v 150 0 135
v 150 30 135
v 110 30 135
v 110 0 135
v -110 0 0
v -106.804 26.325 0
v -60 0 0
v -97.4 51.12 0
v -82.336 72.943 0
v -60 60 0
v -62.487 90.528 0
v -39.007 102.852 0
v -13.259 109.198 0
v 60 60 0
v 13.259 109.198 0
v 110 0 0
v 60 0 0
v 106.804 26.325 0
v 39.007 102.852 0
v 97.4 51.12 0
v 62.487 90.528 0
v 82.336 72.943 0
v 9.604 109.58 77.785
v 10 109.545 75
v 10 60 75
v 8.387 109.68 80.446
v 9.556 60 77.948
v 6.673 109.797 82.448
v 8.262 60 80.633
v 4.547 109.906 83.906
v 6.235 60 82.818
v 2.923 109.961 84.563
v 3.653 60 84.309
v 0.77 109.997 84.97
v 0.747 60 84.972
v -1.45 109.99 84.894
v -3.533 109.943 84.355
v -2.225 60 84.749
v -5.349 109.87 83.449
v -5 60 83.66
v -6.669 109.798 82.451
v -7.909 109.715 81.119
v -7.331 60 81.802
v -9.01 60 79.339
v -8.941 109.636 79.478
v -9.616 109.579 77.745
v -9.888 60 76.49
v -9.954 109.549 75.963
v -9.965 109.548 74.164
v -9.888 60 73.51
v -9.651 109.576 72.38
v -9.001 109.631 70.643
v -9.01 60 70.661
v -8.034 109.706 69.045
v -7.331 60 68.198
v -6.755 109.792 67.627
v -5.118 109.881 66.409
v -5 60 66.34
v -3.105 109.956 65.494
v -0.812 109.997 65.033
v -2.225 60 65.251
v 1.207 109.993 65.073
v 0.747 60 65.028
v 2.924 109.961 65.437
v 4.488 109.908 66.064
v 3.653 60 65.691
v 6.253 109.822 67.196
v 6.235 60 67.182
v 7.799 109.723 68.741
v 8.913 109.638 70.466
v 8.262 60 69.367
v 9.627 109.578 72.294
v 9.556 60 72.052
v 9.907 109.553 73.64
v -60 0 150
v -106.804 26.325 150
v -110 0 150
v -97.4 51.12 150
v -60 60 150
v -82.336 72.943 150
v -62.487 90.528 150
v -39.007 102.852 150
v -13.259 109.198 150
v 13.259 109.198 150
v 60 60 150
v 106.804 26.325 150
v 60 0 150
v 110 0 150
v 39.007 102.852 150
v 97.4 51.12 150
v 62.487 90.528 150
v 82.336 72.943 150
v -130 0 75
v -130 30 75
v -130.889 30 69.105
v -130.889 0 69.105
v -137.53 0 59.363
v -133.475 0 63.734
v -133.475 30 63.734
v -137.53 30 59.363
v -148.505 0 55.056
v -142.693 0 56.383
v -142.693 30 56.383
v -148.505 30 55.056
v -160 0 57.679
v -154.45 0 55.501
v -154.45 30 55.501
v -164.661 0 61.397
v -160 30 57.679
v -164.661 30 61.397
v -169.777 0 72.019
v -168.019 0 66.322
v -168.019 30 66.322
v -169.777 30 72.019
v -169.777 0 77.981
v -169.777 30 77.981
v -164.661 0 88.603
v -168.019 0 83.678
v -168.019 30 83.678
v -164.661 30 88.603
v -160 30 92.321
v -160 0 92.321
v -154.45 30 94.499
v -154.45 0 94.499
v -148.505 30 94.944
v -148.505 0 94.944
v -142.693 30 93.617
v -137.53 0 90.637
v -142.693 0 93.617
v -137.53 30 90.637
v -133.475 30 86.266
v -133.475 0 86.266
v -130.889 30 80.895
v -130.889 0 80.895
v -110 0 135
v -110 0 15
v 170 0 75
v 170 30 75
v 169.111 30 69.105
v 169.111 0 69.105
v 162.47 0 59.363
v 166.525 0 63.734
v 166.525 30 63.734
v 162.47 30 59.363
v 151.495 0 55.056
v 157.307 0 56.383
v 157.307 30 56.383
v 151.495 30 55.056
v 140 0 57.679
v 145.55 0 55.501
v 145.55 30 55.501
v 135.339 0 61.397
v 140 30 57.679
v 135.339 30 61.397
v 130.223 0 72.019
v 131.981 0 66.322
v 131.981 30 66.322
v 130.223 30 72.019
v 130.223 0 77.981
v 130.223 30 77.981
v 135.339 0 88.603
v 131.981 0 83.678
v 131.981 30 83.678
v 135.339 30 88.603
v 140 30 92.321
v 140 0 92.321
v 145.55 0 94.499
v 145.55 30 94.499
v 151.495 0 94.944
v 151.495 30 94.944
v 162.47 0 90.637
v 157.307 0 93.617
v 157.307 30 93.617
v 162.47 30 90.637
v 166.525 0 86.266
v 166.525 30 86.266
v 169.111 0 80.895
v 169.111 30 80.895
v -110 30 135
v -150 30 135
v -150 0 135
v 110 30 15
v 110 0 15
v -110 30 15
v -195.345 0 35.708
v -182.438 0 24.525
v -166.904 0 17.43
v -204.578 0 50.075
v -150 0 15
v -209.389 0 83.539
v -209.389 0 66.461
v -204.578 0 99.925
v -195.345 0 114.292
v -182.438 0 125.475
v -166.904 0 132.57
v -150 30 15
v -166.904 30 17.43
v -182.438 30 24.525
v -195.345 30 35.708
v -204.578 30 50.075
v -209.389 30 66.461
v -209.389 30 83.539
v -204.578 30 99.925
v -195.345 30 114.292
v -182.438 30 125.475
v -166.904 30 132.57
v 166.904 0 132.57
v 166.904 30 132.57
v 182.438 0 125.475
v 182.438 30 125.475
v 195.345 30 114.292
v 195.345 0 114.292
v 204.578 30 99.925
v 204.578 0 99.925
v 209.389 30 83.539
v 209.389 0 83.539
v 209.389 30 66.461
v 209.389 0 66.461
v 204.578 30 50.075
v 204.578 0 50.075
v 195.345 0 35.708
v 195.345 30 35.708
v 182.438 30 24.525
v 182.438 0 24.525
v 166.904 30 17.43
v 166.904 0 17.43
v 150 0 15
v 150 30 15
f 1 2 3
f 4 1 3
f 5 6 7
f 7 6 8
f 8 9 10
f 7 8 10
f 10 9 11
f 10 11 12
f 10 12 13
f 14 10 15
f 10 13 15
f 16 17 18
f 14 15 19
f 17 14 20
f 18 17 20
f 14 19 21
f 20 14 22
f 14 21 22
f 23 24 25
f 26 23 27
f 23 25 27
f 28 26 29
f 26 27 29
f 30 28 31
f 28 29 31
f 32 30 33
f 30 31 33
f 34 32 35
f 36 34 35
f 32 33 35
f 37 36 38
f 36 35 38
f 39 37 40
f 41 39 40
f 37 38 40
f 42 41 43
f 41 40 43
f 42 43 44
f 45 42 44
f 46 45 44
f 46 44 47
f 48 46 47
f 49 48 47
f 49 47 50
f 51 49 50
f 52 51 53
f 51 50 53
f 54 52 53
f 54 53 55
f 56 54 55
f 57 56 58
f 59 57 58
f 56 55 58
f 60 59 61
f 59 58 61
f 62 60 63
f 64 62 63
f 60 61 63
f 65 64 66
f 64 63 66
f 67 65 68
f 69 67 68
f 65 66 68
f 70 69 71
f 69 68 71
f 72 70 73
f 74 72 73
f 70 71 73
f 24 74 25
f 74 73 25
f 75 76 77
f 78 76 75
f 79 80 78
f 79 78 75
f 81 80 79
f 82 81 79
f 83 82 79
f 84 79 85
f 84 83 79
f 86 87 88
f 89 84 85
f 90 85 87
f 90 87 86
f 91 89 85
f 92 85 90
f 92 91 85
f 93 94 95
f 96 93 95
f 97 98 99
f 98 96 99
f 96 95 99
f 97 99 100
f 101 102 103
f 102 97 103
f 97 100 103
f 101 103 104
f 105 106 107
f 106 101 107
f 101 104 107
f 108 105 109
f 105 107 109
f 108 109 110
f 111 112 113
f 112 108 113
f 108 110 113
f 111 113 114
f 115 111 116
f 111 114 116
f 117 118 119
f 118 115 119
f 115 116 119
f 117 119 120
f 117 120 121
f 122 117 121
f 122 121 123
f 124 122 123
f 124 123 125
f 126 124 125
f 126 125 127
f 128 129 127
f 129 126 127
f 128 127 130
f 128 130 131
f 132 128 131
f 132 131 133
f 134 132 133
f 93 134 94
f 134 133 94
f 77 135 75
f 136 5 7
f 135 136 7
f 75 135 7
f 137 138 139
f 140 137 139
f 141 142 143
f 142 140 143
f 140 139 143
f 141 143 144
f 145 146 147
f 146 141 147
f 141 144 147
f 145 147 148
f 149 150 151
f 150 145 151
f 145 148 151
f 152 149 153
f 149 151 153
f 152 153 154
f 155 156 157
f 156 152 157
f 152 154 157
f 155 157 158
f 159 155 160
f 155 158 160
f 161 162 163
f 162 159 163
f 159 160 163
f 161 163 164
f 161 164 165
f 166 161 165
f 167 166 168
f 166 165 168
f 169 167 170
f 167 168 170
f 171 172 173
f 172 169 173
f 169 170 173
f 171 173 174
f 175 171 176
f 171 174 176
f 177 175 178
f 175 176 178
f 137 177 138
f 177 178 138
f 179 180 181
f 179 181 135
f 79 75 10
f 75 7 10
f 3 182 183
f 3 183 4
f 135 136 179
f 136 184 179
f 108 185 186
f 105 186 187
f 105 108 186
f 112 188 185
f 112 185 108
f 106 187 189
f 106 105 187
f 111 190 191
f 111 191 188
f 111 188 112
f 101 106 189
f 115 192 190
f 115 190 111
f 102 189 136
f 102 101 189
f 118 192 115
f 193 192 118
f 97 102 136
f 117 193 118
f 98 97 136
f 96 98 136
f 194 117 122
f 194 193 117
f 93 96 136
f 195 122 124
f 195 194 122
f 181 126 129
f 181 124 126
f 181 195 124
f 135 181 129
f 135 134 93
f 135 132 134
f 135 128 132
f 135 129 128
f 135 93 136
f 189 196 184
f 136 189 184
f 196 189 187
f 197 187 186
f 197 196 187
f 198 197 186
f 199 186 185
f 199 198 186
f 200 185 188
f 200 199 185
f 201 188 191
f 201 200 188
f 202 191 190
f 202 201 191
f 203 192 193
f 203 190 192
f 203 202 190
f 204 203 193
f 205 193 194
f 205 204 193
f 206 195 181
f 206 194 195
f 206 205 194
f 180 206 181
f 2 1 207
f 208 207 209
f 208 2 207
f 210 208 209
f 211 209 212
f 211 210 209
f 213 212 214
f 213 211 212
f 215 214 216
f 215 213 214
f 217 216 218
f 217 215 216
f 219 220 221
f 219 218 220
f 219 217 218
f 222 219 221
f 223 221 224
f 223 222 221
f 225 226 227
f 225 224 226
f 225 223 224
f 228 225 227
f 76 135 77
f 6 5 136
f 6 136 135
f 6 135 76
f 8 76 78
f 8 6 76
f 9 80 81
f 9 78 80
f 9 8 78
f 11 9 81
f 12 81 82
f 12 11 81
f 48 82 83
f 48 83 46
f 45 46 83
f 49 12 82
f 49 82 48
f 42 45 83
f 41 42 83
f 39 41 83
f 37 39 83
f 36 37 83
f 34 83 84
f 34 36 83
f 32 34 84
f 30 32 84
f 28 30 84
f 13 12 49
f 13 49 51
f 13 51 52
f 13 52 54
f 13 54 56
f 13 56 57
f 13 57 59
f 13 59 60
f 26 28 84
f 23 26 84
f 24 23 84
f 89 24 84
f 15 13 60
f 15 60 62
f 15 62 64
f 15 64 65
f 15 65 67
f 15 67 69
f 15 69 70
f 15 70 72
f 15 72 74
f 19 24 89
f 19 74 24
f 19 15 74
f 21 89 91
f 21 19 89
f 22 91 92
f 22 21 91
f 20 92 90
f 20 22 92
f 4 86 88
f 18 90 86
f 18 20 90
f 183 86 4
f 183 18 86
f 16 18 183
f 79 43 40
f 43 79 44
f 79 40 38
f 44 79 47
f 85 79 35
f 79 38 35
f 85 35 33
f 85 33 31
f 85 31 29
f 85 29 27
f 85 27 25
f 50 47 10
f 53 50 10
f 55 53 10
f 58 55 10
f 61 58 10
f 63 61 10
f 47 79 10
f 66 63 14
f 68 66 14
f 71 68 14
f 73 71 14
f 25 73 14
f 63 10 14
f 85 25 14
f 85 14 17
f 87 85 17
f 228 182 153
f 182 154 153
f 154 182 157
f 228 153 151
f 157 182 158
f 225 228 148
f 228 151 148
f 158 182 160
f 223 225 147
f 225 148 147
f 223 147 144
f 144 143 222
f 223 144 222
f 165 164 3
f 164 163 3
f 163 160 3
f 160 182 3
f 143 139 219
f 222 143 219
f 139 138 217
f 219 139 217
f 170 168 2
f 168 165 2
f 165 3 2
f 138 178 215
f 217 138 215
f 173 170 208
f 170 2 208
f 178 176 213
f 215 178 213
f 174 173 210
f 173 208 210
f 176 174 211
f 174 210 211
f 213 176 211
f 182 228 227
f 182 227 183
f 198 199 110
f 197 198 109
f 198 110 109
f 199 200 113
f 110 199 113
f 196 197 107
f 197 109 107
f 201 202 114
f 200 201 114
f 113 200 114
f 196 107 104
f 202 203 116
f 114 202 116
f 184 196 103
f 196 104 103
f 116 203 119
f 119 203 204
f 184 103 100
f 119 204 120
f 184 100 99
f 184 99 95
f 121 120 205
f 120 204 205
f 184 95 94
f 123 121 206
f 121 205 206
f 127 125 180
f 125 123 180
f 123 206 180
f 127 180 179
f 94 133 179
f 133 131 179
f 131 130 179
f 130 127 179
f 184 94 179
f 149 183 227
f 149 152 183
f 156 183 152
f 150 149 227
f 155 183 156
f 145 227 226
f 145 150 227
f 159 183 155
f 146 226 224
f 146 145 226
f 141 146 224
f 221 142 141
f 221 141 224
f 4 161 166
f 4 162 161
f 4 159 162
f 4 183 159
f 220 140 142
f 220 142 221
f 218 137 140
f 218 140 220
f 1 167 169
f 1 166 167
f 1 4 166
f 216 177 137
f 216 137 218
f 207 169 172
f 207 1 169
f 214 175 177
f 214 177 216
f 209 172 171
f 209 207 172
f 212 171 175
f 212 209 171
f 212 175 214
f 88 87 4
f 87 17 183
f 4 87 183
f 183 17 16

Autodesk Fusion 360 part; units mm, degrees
sketch "Sketch1" plane through (0, 0, 0) normal (0, 0, 1) x (1, 0, 0)
  arc A0 (110, 0) -> (-110, 0) centre (0, 0) ccw
  line L0 (-110, 0) -> (110, 0)
  line L1 (-60, 60) -> (60, 60)
  line L2 (60, 60) -> (60, 0)
  line L3 (60, 0) -> (-60, 0)
  line L4 (-60, 0) -> (-60, 60)
  dimension "d1" = 220
  dimension "d4" = 120
  dimension "d5" = 60
extrude "Extrude1" add sketch "Sketch1" along normal blind 150 contours A0 L0 L1 L2 L4 makes body 1
sketch "Sketch2" plane through (0, 60, 0) normal (0, -1, 0) x (1, 0, 0)
  line L0 (-60, 0) -> (60, 0)
  line L1 (60, 0) -> (60, 150)
  line L2 (60, 150) -> (-60, 150)
  line L3 (-60, 150) -> (-60, 0)
  circle A0 centre (150, 75) radius 20
  line L4 (0, -50) -> (0, 0)
  line L5 (0, 150) -> (0, 180)
  arc A1 (150, 15) -> (150, 135) centre (150, 75) ccw
  line L6 (150, 135) -> (110, 135)
  line L7 (150, 15) -> (110, 15)
  line L8 (0, -60) -> (0, 194.892)
  arc A2 (-150, 135) -> (-150, 15) centre (-150, 75) ccw
  circle A3 centre (-150, 75) radius 20
  line L9 (-150, 135) -> (-110, 135)
  line L10 (-150, 15) -> (-110, 15)
  line L11 (110, 15) -> (110, 135)
  line L12 (-110, 15) -> (-110, 135)
extrude "Extrude2" add sketch "Sketch2" along normal blind 60 separate body contours A1 L6 L7 L11 | A2 L9 L10 L12 makes body 2 at (161.8888, 20, 133.8103) makes body 3 at (-161.8888, 20, 16.1897)
extrude "Extrude3" cut 2 faces at (134.2311, 60, 28.7942) (-134.2311, 60, 28.7942) along direction (0, -1, 0) blind 30 on bodies 2 3 bodies 2 3
combine "Combine1" operation add target body 1 tool bodies 2 3
sketch "Sketch3" plane through (0, 60, 0) normal (0, -1, 0) x (1, 0, 0)
  line L0 (-60, 0) -> (60, 0)
  line L1 (60, 0) -> (60, 150)
  line L2 (60, 150) -> (-60, 150)
  line L3 (-60, 150) -> (-60, 0)
  circle A0 centre (0, 75) radius 10
  dimension "d16" = 20
  dimension "d17" = 75
extrude "Extrude4" cut sketch "Sketch3" along normal mid plane 200 contours A0 bodies 1
sketch "Sketch4" plane through (0, 0, 0) normal (0, 0, 1) x (1, 0, 0)
